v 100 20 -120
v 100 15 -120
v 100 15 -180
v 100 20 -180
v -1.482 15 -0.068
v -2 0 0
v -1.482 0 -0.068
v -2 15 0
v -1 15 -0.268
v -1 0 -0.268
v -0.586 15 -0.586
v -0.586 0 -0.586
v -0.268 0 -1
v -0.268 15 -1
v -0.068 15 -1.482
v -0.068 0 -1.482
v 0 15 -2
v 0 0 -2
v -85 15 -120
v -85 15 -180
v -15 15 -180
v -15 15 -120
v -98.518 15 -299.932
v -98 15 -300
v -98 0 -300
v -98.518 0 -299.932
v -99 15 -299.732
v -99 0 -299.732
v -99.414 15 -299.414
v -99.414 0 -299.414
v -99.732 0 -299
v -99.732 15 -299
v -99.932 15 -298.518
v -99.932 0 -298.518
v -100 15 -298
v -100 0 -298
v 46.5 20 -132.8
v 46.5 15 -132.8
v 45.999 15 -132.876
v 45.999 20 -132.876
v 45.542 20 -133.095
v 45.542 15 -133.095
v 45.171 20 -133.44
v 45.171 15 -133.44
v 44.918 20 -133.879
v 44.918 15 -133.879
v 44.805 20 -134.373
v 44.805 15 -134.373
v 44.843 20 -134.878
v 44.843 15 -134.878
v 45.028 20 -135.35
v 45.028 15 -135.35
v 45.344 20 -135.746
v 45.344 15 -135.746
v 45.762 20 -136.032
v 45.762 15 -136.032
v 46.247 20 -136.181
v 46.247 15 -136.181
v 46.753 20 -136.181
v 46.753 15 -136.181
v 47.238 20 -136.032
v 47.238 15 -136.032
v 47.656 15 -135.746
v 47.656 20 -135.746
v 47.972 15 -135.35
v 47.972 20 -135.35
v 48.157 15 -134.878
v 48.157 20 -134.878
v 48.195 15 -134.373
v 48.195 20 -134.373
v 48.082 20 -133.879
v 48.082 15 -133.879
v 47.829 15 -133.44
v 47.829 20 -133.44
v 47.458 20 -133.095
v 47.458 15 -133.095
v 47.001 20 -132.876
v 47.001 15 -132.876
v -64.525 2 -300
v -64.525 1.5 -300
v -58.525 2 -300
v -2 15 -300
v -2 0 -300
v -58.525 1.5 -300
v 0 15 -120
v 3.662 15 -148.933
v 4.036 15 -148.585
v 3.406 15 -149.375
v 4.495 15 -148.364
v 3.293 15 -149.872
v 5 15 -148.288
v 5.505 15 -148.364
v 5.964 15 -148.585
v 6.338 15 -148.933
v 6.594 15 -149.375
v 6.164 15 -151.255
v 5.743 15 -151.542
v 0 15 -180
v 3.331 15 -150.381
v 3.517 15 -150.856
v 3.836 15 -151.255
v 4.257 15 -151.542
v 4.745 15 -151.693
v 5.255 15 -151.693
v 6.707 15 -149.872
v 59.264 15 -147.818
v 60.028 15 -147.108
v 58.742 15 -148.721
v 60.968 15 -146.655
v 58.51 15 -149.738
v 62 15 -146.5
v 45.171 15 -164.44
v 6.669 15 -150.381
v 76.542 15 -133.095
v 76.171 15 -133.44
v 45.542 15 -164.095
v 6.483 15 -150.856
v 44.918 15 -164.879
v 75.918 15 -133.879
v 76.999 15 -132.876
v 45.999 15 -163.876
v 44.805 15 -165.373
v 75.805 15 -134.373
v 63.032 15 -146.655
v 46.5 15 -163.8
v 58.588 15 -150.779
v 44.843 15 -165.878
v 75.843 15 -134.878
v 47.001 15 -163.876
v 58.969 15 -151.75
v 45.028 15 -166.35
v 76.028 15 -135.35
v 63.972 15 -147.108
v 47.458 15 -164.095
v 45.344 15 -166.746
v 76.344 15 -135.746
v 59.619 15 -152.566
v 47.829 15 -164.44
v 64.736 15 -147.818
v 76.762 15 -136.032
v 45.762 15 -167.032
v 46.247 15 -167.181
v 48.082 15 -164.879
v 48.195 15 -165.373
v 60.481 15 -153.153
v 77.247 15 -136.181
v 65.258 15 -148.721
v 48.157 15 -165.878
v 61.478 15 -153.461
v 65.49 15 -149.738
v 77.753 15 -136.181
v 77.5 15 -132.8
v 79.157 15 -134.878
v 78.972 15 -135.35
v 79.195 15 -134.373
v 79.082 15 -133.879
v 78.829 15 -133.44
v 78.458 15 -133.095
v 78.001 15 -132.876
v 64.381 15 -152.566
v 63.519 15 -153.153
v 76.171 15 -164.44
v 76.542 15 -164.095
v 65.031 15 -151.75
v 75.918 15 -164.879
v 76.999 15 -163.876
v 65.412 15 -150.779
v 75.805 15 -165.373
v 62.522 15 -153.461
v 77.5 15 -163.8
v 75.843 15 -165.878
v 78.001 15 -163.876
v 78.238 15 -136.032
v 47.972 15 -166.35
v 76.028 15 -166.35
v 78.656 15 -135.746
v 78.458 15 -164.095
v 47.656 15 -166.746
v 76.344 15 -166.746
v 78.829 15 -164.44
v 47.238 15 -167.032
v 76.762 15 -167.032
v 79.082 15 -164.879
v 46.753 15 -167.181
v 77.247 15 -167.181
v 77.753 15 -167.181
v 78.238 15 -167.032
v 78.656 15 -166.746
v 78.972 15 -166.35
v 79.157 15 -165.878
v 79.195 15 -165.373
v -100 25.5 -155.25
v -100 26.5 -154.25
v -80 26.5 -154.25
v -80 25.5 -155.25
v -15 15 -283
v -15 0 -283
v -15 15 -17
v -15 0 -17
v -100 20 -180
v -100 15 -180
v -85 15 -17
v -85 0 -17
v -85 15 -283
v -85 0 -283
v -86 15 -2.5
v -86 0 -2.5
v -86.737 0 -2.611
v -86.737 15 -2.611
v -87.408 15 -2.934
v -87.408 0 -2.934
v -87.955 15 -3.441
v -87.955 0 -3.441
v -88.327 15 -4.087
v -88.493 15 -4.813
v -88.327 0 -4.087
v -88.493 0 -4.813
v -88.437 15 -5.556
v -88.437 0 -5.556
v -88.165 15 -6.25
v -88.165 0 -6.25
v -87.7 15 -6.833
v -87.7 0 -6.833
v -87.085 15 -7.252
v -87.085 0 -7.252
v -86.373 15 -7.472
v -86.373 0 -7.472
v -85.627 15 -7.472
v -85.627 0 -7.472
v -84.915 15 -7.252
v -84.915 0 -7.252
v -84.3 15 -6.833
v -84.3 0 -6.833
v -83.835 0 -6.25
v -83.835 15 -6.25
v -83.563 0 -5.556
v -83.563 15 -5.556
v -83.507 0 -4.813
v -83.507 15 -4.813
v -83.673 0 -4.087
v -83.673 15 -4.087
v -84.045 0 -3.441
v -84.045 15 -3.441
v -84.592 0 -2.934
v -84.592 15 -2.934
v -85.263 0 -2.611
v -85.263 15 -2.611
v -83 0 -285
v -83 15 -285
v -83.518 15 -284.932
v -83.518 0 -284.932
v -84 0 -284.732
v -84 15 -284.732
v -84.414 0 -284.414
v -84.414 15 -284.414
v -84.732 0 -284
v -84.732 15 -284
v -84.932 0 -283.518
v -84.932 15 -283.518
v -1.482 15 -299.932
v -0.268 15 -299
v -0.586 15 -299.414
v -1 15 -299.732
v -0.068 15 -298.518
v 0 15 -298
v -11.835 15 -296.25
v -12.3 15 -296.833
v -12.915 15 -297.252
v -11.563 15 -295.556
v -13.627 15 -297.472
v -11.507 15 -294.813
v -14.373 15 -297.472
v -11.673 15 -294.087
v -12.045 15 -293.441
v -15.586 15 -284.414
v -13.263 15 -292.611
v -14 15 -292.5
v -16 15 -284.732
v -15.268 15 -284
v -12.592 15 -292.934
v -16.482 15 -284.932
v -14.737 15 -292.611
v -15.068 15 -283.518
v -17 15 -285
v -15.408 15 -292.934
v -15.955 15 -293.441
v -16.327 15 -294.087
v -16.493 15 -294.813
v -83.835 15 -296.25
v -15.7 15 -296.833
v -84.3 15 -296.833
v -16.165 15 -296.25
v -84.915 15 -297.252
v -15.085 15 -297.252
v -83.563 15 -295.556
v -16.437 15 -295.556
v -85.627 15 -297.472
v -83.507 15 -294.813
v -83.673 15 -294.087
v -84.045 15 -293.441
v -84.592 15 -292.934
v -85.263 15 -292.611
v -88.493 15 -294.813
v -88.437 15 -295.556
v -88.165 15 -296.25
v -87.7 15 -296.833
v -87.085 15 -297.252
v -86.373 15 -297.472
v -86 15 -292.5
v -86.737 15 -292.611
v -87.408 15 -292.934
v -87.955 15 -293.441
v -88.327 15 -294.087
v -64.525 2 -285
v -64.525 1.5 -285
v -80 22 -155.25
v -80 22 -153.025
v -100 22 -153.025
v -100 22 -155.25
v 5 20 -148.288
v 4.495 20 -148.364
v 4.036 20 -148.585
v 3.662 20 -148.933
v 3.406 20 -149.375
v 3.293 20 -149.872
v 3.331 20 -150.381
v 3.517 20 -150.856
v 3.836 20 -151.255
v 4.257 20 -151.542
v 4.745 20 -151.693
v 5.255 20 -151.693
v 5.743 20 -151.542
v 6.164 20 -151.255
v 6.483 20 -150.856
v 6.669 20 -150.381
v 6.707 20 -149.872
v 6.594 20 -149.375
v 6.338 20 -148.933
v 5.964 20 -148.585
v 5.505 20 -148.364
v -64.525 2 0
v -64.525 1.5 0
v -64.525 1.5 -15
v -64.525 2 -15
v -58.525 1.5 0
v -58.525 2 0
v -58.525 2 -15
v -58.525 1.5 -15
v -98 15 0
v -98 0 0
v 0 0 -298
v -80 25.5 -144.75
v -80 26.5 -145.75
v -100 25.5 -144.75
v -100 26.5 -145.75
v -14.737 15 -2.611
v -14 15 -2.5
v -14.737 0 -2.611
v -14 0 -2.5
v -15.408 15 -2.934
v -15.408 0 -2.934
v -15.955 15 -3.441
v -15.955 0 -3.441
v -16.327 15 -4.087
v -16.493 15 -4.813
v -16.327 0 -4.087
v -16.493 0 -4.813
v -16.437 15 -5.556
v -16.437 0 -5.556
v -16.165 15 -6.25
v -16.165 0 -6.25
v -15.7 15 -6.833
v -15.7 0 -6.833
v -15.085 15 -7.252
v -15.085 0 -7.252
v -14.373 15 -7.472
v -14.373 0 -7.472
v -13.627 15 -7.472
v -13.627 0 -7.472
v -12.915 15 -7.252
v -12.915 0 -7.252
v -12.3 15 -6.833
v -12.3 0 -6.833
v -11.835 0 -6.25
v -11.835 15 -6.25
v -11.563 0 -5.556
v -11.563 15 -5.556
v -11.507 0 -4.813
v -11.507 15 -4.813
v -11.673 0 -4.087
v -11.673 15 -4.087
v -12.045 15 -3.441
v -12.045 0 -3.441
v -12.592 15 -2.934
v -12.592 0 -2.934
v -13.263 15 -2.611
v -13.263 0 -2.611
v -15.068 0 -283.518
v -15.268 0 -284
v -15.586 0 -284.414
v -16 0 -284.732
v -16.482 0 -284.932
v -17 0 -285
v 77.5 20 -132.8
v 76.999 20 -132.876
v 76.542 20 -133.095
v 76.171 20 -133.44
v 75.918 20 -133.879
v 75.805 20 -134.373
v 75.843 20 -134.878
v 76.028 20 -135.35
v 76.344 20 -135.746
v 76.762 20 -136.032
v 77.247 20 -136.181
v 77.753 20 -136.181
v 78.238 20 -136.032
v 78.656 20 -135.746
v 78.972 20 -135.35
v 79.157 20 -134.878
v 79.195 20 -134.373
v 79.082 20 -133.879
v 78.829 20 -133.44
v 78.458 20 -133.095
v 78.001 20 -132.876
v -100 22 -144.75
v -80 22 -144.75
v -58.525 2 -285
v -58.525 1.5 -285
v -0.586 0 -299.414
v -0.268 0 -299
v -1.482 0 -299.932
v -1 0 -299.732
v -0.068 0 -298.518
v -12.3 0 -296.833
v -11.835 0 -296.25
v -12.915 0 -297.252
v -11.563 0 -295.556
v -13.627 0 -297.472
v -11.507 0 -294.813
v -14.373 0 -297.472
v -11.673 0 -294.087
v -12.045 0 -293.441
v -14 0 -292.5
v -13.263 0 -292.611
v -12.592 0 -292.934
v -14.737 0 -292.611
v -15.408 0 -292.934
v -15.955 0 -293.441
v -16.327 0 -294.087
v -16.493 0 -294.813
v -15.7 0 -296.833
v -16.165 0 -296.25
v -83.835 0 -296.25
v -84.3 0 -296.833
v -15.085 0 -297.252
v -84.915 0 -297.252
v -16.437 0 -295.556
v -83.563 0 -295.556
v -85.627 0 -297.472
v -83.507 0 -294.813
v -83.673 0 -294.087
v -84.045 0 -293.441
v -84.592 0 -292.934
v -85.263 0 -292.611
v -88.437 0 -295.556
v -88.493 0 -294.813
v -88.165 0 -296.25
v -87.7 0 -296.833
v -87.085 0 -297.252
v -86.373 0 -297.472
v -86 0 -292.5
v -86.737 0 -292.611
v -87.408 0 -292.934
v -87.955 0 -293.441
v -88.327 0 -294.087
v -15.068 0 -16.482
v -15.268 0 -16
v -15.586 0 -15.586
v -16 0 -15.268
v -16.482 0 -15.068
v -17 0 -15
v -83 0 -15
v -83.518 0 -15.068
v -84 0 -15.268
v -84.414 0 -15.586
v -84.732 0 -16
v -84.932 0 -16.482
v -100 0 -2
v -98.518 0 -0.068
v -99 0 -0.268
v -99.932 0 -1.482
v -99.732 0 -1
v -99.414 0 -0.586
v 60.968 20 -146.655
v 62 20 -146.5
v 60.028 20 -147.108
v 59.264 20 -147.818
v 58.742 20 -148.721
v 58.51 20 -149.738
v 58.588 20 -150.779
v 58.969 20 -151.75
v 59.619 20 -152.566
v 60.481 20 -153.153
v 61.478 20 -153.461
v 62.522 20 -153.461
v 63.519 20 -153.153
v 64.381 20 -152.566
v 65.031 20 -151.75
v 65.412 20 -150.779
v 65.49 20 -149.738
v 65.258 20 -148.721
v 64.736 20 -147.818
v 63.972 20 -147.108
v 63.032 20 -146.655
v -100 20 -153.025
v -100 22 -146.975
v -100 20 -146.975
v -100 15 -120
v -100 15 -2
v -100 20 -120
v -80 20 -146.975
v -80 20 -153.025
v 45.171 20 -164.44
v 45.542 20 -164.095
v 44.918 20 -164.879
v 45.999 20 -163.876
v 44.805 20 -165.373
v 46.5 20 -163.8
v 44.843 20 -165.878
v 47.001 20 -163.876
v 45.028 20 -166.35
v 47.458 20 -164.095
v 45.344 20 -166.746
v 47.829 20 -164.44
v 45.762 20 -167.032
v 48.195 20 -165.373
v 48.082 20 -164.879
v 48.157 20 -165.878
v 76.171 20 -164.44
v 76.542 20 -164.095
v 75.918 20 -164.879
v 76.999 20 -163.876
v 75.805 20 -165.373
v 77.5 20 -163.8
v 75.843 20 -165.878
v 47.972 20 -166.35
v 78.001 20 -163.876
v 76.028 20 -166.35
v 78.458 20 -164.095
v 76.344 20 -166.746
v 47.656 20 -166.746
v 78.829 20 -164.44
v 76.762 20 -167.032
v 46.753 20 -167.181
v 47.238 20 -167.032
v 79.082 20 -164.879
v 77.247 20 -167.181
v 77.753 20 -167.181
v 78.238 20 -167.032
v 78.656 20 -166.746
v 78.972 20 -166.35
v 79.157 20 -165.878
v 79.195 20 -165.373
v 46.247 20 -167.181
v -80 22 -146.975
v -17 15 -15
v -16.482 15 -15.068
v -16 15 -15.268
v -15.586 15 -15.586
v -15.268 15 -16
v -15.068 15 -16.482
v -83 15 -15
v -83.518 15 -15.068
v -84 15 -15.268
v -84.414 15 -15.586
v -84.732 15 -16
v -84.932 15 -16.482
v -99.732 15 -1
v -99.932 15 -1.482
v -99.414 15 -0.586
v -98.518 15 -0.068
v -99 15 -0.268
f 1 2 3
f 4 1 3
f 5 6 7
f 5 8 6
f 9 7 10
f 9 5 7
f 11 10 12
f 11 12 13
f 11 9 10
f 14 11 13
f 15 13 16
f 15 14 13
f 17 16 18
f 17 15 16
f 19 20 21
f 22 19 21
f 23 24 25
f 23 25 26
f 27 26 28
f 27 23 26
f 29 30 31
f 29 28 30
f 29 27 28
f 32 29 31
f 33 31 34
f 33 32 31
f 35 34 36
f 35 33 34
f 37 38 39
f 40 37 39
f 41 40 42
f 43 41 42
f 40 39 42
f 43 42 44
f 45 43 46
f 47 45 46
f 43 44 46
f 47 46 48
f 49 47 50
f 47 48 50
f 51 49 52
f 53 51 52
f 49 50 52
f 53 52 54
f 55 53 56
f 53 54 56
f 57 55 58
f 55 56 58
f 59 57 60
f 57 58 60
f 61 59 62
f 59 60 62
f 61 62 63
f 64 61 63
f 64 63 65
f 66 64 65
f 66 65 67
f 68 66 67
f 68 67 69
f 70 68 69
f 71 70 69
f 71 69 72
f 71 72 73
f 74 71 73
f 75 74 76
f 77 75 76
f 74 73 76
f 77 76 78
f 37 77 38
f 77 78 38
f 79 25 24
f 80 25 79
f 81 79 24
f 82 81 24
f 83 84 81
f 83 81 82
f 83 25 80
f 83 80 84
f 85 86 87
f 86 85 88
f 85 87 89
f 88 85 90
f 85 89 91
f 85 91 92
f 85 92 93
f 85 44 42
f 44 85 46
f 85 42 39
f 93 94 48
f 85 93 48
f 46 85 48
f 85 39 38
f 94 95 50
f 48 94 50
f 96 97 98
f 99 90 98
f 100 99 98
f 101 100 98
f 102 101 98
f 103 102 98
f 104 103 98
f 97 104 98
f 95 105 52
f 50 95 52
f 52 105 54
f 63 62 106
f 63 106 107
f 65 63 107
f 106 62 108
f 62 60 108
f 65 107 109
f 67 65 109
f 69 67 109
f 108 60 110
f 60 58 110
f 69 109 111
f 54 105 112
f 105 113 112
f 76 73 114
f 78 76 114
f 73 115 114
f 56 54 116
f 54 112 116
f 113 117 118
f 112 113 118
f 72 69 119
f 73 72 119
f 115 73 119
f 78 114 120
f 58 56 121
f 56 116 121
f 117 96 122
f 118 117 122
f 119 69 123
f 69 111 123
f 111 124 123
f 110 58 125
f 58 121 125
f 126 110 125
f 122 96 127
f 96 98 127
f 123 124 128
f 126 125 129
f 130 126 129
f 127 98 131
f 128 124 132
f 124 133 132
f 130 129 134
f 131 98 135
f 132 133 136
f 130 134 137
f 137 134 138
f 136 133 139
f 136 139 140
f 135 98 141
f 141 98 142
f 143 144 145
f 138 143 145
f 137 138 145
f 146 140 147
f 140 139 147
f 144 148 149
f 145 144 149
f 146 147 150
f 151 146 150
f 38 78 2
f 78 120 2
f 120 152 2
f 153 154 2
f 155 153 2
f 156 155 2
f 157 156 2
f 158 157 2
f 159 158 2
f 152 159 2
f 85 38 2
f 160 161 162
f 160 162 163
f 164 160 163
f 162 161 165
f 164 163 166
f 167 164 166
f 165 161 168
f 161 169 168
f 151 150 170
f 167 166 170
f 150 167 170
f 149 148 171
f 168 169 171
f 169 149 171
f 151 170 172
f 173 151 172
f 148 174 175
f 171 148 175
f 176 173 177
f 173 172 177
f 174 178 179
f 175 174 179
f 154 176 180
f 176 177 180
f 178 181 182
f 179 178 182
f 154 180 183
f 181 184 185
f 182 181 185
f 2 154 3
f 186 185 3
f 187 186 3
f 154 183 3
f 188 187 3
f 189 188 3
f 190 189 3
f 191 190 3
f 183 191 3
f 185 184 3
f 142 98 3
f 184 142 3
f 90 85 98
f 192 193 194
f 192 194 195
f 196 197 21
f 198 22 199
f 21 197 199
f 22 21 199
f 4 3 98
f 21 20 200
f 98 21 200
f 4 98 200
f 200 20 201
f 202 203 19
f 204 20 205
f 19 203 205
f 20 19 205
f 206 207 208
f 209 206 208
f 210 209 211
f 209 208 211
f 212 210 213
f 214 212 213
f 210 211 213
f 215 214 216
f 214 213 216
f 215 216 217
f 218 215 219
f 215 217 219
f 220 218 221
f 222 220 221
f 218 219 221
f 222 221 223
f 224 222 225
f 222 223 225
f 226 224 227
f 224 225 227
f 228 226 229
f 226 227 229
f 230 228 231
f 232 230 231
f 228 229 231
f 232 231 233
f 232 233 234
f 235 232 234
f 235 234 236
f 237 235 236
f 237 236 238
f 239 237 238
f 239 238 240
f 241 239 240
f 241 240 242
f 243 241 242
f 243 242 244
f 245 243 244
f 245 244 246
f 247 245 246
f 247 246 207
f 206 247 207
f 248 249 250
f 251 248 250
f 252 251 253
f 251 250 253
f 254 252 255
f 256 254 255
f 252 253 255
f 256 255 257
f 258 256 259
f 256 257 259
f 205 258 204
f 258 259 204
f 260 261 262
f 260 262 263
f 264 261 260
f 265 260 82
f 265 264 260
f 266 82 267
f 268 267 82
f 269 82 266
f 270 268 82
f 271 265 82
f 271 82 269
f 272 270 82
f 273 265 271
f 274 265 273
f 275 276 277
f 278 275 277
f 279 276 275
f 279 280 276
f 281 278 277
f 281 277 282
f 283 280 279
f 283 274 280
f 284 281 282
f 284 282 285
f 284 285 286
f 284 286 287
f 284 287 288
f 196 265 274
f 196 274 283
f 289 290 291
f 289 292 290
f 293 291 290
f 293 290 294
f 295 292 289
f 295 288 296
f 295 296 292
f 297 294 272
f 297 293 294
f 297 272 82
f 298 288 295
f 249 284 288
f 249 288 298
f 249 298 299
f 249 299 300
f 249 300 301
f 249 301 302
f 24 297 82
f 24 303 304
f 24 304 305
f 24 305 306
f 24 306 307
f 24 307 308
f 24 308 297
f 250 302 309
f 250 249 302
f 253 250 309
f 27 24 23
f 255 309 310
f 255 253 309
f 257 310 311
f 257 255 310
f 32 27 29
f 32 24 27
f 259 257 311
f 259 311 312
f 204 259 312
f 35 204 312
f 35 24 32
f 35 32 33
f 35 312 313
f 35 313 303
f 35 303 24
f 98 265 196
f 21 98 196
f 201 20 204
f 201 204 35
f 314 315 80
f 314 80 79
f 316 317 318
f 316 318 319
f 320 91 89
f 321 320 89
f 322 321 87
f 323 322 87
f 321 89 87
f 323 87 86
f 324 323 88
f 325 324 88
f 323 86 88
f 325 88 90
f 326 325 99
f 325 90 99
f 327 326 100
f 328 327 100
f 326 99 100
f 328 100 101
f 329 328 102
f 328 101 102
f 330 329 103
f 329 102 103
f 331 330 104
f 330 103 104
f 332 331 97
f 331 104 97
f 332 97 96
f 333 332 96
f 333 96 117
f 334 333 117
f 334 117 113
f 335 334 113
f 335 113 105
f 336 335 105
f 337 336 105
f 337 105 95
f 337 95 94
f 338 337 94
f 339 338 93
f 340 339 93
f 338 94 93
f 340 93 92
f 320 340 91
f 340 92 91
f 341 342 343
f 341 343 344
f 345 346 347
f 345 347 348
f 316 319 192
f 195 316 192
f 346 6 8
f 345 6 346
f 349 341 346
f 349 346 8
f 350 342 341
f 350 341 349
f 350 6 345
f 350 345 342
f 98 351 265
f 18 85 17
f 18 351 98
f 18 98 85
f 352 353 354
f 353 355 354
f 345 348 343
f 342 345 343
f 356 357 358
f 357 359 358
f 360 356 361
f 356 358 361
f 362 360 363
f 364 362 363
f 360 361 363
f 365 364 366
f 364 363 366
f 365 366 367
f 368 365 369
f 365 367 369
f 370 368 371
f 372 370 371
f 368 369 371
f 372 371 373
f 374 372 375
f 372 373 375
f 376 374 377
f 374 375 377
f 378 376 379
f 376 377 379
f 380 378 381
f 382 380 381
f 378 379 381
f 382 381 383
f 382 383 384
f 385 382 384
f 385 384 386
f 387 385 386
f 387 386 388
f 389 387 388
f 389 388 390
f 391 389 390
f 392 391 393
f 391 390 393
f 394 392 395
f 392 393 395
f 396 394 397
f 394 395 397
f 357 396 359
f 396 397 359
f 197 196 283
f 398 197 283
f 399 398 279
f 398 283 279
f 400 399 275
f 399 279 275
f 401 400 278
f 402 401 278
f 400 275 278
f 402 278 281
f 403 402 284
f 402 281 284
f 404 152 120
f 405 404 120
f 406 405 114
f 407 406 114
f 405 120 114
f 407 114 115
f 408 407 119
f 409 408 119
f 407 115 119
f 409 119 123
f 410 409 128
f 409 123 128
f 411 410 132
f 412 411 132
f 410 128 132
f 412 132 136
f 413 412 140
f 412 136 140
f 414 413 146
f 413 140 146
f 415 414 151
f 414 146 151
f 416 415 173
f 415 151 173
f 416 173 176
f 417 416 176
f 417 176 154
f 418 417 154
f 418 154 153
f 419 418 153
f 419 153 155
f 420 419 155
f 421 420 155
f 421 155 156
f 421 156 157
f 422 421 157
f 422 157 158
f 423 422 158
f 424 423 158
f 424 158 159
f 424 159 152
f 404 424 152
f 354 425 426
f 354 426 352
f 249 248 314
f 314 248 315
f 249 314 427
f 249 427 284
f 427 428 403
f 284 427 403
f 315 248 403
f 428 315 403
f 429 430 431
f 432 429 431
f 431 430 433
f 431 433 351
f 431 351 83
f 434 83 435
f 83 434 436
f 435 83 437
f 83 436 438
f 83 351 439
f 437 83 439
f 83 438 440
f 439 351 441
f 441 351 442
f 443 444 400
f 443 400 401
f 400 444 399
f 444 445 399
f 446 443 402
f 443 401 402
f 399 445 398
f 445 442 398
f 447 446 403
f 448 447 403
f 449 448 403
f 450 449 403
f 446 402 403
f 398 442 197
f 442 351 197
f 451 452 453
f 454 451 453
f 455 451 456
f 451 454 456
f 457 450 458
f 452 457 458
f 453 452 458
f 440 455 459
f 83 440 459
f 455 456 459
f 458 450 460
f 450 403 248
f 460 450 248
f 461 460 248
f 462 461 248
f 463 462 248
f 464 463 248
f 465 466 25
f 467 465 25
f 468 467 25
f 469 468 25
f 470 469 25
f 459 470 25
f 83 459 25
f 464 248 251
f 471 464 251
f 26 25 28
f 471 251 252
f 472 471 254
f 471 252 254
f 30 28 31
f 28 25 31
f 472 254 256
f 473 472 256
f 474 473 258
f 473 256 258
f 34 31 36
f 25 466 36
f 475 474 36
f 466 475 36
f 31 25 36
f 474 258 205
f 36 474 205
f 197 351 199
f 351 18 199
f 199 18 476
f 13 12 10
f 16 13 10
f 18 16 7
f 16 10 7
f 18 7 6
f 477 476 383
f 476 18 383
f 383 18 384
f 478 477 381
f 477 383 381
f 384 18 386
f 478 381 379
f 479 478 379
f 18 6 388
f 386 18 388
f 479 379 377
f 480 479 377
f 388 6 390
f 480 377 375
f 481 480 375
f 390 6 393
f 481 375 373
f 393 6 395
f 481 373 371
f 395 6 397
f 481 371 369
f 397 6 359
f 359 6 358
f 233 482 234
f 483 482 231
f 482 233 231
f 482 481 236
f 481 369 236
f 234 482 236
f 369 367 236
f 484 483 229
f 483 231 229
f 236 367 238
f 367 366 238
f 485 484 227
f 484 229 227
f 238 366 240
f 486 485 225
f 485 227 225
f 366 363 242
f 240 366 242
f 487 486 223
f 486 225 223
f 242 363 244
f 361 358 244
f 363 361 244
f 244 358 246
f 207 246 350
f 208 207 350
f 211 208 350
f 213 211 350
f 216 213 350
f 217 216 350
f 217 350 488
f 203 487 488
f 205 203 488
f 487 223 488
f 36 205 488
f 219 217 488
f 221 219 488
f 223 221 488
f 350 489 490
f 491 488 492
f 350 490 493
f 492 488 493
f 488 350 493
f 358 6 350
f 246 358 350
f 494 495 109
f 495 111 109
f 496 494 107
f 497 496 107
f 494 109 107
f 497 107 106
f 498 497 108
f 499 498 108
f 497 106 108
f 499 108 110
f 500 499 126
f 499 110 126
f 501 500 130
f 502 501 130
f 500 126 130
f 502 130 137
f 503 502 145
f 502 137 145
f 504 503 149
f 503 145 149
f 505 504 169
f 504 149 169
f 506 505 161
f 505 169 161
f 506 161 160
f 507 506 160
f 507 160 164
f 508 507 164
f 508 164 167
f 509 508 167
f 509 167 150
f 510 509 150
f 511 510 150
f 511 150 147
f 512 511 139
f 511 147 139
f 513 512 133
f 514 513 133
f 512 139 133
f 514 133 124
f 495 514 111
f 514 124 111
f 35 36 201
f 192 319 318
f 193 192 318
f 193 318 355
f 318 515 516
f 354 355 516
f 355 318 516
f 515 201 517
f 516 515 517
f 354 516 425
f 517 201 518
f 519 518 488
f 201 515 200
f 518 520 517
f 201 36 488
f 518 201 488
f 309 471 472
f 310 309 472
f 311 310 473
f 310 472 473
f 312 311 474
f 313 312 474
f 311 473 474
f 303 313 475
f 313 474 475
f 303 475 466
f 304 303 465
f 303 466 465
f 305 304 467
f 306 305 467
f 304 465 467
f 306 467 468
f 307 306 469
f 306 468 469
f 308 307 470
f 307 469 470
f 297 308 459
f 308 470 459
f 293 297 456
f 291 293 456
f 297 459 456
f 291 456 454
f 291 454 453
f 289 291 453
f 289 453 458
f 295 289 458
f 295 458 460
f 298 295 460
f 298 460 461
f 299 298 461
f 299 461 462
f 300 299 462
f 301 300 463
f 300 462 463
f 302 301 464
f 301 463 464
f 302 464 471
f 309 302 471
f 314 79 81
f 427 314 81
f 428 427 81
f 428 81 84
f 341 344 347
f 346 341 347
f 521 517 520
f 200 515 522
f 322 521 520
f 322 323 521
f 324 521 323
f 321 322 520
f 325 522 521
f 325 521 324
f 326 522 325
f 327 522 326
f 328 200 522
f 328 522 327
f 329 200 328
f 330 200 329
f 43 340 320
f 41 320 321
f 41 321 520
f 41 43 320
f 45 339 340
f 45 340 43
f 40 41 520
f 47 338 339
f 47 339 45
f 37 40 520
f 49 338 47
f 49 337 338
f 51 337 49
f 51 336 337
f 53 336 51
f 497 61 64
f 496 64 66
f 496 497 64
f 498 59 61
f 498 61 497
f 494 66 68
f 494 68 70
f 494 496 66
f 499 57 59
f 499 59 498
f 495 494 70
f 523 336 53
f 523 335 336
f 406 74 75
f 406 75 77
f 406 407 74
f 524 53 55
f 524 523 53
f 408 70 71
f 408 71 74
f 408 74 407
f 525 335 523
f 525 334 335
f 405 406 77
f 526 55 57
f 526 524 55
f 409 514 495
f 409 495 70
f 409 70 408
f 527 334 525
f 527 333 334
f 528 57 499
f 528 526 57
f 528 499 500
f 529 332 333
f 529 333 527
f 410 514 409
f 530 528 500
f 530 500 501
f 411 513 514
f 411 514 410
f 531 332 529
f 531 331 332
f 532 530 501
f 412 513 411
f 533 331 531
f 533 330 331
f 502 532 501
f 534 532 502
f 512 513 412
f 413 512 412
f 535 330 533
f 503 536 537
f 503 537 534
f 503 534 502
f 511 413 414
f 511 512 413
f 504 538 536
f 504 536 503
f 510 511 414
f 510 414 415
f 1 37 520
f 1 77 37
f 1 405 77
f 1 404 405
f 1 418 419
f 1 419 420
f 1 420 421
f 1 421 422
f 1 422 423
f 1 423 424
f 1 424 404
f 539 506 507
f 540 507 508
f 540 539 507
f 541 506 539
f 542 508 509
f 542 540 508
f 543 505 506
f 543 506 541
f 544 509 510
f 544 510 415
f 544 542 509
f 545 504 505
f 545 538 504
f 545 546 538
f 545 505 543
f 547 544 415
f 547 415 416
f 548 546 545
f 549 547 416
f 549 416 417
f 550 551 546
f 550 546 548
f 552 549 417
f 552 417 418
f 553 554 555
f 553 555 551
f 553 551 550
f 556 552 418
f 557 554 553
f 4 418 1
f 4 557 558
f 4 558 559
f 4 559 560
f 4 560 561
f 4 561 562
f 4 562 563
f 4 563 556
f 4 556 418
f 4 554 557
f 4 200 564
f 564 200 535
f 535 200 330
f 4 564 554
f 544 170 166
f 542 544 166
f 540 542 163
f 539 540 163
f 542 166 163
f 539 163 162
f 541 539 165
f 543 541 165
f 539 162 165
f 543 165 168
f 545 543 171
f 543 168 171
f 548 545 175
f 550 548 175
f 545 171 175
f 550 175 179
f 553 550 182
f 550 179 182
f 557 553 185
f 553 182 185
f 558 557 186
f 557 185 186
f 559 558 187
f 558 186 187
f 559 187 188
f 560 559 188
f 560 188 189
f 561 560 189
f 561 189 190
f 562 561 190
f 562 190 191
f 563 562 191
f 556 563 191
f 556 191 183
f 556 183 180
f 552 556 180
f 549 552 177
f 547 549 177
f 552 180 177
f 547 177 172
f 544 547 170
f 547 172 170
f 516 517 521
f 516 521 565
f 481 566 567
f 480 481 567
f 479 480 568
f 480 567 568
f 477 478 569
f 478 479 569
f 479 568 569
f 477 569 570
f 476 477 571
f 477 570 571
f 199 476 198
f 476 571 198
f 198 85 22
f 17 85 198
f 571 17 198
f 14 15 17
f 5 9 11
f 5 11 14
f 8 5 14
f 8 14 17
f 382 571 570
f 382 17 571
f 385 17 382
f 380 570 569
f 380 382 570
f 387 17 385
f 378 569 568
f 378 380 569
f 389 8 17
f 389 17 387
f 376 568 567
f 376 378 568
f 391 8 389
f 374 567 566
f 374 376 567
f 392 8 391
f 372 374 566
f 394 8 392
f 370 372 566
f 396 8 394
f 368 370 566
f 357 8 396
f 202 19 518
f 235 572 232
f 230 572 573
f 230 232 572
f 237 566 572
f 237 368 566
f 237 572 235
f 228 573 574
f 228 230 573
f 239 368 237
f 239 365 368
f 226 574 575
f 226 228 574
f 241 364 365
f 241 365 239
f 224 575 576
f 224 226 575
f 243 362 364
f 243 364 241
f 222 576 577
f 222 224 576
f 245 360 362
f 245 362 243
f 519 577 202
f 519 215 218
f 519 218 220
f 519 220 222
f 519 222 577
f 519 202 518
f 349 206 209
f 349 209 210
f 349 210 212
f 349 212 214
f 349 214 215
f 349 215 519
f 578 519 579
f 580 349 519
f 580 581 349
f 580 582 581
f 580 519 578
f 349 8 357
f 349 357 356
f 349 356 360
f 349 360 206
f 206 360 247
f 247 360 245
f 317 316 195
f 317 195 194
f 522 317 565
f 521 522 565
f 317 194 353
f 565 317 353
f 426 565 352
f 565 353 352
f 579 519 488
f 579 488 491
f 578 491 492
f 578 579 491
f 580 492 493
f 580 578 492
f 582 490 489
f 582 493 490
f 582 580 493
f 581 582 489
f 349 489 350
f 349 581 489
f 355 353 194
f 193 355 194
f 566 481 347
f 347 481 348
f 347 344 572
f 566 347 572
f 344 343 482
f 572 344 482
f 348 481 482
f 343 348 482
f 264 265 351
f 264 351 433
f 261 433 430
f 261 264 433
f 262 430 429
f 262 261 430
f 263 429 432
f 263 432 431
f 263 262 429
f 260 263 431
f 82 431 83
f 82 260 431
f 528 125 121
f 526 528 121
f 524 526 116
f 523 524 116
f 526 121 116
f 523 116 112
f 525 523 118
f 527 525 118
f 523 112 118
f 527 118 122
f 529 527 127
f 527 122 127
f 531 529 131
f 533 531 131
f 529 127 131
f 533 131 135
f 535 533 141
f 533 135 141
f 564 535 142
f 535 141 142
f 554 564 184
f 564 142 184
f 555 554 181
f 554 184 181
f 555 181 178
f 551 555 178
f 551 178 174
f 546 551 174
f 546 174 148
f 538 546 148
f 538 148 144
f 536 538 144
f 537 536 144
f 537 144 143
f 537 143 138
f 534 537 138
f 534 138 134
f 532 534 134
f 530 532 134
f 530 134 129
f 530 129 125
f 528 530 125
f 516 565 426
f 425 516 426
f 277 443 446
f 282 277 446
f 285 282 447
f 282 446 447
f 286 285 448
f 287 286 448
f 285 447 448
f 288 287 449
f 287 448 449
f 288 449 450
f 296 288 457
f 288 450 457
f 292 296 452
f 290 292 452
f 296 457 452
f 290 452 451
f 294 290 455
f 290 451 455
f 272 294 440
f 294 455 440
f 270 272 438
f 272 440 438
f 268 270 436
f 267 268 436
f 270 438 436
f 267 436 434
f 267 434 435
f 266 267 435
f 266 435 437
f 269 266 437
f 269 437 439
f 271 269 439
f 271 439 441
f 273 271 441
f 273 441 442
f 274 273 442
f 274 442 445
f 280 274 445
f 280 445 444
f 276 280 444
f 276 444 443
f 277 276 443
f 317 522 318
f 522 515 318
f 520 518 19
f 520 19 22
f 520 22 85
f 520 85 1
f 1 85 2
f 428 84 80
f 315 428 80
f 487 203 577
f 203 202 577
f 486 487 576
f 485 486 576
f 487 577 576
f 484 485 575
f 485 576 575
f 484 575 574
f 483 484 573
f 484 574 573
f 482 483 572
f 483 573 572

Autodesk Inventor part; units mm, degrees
ref_plane "YZ Plane" through (0, 0, 0) normal (1, 0, 0) x (0, 1, 0)
ref_plane "XZ Plane" through (0, 0, 0) normal (0, 1, 0) x (-1, 0, 0)
ref_plane "XY Plane" through (0, 0, 0) normal (0, 0, 1) x (1, 0, 0)
sketch "Szkic1" plane through (0, 0, 0) normal (0, 1, 0) x (-1, 0, 0)
  line L0 (0, 0) -> (100, 0)
  line L1 (100, 0) -> (100, -300)
  line L2 (100, -300) -> (0, -300)
  line L3 (0, -300) -> (0, 0)
  dimension "d0" = 300
  dimension "d1" = 100
sketch "Szkic2" plane through (0, 0, 0) normal (0, 1, 0) x (-1, 0, 0)
  line L0 (15, -15) -> (85, -15)
  line L1 (85, -15) -> (85, -285)
  line L2 (85, -285) -> (15, -285)
  line L3 (15, -285) -> (15, -15)
  point P0 (0, 0)
  dimension "d2" = 70
  dimension "d3" = 270
  dimension "d4" = 15
  dimension "d5" = 15
extrude "Wyciągnięcie proste1" add sketch "Szkic1" along normal blind 15
extrude "Wyciągnięcie proste2" cut sketch "Szkic2" along normal blind 15
fillet "Zaokrąglenie1" radius 2 8 edges at (-85, 7.5, -285) (-15, 7.5, -285) (-15, 7.5, -15) (-85, 7.5, -15) (-100, 7.5, 0) (-100, 7.5, -300) (0, 7.5, -300) (0, 7.5, 0)
sketch "Szkic3" plane through (0, 15, 0) normal (0, 1, 0) x (1, 0, 0)
  line L0 (0, 2) -> (0, 298) projected
  line L1 (-2, 300) -> (-98, 300) projected
  line L2 (-98, 0) -> (-2, 0) projected
  line L3 (-100, 298) -> (-100, 2) projected
  line L4 (-85, 17) -> (-85, 283) projected
  point P0 (0, 0)
  point P1 (-14, 295)
  point P2 (-14, 5)
  point P3 (-86, 295)
  point P4 (-86, 5)
  point P5 (-30, 100)
  point P6 (-100, 30)
  dimension "d12" = 5
  dimension "d13" = 5
  dimension "d14" = 5
  dimension "d18" = 5
  dimension "d32" = 14
  dimension "d33" = 14
  dimension "d34" = 14
  dimension "d35" = 14
hole "Otwór1" at (-14, 15, -295) at (-14, 15, -5) at (-86, 15, -295) at (-86, 15, -5) direction (0, -1, 0) diameter 5 depth 15
sketch "Szkic4" plane through (0, 15, 0) normal (0, 1, 0) x (1, 0, 0)
  line L0 (-100, 298) -> (-100, 2) projected
  line L1 (-100, 120) -> (100, 120)
  line L2 (100, 120) -> (100, 180)
  line L3 (100, 180) -> (-100, 180)
  line L4 (-100, 180) -> (-100, 120)
  line L5 (-98, 0) -> (-2, 0) projected
  point P0 (0, 0)
  point P1 (-100, 180)
  point P2 (-100, 30)
  dimension "d26" = 60
  dimension "d29" = 120
  dimension "d30" = 200
extrude "Wyciągnięcie proste3" add sketch "Szkic4" along normal blind 5
sketch "Szkic5" plane through (-100, 0, -298) normal (-1, 0, 0) x (0, 0, 1)
  line L0 (148, 20) -> (144.975, 20)
  line L1 (118, 20) -> (178, 20) projected
  line L2 (144.975, 20) -> (144.975, 22)
  line L3 (144.975, 22) -> (142.75, 22)
  line L4 (142.75, 22) -> (142.75, 25.5)
  line L5 (148, 26.5) -> (143.75, 26.5)
  line L6 (143.75, 26.5) -> (142.75, 25.5)
  line L7 (148, 20) -> (151.025, 20)
  line L8 (151.025, 20) -> (151.025, 22)
  line L9 (151.025, 22) -> (153.25, 22)
  line L10 (153.25, 22) -> (153.25, 25.5)
  line L11 (148, 26.5) -> (152.25, 26.5)
  line L12 (152.25, 26.5) -> (153.25, 25.5)
  line L13 (-2, 0) -> (-2, 15) projected
  point P0 (298, 0)
  point P1 (151.025, 20)
  dimension "d36" = 3.025
  dimension "d37" = 2
  dimension "d38" = 2.225
  dimension "d39" = 3.5
  dimension "d40" = 6.5
  dimension "d41" = 4.25
  dimension "d71" = 150
extrude "Wyciągnięcie proste4" add sketch "Szkic5" against normal blind 20
sketch "Szkic6" plane through (0, 20, 0) normal (0, 1, 0) x (1, 0, 0)
  line L0 (0, 2) -> (0, 120) projected
  line L1 (-100, 120) -> (100, 120) projected
  point P0 (0, 0)
  point P1 (5, 150)
  dimension "d51" = 5
  dimension "d69" = 30
hole "Otwór2" at (5, 20, -150) direction (0, -1, 0) diameter 3.424 end through all
sketch "Szkic7" plane through (0, 20, 0) normal (0, 1, 0) x (1, 0, 0)
  circle A0 centre (5, 150) radius 1.712 projected
  line L0 (-100, 120) -> (100, 120) projected
  point P0 (0, 0)
  point P1 (62, 150)
  dimension "d52" = 57
  dimension "d70" = 30
hole "Otwór3" at (62, 20, -150) direction (0, -1, 0) diameter 7 end through all
sketch "Szkic8" plane through (0, 20, 0) normal (0, 1, 0) x (1, 0, 0)
  circle A0 centre (62, 150) radius 3.5 projected
  line L0 (46.5, 134.5) -> (77.5, 165.5) construction
  line L1 (77.5, 134.5) -> (46.5, 165.5) construction
  point P0 (0, 0)
  dimension "d60" = 31
  dimension "d61" = 31
hole "Otwór4" at (46.5, 20, -165.5) at (77.5, 20, -165.5) at (77.5, 20, -134.5) at (46.5, 20, -134.5) direction (0, -1, 0) diameter 3.4 end through all clearance for "Śruba ze łbem stożkowym ISO 2009/7046" size "M3" standard "ISO"
sketch "Szkic9" plane through (-98, 0, 0) normal (0, 0, 1) x (1, 0, 0)
  line L0 (33.475, 2) -> (39.475, 2)
  line L1 (39.475, 2) -> (39.475, 1.5)
  line L2 (39.475, 1.5) -> (33.475, 1.5)
  line L3 (33.475, 1.5) -> (33.475, 2)
  line L4 (98, 0) -> (98, 15) projected
  line L5 (0, 0) -> (96, 0) projected
  line L6 (-2, 15) -> (-2, 0) projected
  point P0 (33.475, 1.75)
  dimension "d72" = 6
  dimension "d73" = 0.5
  dimension "d75" = 1.5
  dimension "d78" = 35.475
extrude "Wyciągnięcie proste5" cut sketch "Szkic9" against normal through all
equation "\"d13\" = d12"
equation "\"d14\" = d12"
equation "\"d18\" = d12"
equation "\"d33\" = d32"
equation "\"d34\" = d32"
equation "\"d35\" = d32"
properties part number "podstawka_prowadzaca"
